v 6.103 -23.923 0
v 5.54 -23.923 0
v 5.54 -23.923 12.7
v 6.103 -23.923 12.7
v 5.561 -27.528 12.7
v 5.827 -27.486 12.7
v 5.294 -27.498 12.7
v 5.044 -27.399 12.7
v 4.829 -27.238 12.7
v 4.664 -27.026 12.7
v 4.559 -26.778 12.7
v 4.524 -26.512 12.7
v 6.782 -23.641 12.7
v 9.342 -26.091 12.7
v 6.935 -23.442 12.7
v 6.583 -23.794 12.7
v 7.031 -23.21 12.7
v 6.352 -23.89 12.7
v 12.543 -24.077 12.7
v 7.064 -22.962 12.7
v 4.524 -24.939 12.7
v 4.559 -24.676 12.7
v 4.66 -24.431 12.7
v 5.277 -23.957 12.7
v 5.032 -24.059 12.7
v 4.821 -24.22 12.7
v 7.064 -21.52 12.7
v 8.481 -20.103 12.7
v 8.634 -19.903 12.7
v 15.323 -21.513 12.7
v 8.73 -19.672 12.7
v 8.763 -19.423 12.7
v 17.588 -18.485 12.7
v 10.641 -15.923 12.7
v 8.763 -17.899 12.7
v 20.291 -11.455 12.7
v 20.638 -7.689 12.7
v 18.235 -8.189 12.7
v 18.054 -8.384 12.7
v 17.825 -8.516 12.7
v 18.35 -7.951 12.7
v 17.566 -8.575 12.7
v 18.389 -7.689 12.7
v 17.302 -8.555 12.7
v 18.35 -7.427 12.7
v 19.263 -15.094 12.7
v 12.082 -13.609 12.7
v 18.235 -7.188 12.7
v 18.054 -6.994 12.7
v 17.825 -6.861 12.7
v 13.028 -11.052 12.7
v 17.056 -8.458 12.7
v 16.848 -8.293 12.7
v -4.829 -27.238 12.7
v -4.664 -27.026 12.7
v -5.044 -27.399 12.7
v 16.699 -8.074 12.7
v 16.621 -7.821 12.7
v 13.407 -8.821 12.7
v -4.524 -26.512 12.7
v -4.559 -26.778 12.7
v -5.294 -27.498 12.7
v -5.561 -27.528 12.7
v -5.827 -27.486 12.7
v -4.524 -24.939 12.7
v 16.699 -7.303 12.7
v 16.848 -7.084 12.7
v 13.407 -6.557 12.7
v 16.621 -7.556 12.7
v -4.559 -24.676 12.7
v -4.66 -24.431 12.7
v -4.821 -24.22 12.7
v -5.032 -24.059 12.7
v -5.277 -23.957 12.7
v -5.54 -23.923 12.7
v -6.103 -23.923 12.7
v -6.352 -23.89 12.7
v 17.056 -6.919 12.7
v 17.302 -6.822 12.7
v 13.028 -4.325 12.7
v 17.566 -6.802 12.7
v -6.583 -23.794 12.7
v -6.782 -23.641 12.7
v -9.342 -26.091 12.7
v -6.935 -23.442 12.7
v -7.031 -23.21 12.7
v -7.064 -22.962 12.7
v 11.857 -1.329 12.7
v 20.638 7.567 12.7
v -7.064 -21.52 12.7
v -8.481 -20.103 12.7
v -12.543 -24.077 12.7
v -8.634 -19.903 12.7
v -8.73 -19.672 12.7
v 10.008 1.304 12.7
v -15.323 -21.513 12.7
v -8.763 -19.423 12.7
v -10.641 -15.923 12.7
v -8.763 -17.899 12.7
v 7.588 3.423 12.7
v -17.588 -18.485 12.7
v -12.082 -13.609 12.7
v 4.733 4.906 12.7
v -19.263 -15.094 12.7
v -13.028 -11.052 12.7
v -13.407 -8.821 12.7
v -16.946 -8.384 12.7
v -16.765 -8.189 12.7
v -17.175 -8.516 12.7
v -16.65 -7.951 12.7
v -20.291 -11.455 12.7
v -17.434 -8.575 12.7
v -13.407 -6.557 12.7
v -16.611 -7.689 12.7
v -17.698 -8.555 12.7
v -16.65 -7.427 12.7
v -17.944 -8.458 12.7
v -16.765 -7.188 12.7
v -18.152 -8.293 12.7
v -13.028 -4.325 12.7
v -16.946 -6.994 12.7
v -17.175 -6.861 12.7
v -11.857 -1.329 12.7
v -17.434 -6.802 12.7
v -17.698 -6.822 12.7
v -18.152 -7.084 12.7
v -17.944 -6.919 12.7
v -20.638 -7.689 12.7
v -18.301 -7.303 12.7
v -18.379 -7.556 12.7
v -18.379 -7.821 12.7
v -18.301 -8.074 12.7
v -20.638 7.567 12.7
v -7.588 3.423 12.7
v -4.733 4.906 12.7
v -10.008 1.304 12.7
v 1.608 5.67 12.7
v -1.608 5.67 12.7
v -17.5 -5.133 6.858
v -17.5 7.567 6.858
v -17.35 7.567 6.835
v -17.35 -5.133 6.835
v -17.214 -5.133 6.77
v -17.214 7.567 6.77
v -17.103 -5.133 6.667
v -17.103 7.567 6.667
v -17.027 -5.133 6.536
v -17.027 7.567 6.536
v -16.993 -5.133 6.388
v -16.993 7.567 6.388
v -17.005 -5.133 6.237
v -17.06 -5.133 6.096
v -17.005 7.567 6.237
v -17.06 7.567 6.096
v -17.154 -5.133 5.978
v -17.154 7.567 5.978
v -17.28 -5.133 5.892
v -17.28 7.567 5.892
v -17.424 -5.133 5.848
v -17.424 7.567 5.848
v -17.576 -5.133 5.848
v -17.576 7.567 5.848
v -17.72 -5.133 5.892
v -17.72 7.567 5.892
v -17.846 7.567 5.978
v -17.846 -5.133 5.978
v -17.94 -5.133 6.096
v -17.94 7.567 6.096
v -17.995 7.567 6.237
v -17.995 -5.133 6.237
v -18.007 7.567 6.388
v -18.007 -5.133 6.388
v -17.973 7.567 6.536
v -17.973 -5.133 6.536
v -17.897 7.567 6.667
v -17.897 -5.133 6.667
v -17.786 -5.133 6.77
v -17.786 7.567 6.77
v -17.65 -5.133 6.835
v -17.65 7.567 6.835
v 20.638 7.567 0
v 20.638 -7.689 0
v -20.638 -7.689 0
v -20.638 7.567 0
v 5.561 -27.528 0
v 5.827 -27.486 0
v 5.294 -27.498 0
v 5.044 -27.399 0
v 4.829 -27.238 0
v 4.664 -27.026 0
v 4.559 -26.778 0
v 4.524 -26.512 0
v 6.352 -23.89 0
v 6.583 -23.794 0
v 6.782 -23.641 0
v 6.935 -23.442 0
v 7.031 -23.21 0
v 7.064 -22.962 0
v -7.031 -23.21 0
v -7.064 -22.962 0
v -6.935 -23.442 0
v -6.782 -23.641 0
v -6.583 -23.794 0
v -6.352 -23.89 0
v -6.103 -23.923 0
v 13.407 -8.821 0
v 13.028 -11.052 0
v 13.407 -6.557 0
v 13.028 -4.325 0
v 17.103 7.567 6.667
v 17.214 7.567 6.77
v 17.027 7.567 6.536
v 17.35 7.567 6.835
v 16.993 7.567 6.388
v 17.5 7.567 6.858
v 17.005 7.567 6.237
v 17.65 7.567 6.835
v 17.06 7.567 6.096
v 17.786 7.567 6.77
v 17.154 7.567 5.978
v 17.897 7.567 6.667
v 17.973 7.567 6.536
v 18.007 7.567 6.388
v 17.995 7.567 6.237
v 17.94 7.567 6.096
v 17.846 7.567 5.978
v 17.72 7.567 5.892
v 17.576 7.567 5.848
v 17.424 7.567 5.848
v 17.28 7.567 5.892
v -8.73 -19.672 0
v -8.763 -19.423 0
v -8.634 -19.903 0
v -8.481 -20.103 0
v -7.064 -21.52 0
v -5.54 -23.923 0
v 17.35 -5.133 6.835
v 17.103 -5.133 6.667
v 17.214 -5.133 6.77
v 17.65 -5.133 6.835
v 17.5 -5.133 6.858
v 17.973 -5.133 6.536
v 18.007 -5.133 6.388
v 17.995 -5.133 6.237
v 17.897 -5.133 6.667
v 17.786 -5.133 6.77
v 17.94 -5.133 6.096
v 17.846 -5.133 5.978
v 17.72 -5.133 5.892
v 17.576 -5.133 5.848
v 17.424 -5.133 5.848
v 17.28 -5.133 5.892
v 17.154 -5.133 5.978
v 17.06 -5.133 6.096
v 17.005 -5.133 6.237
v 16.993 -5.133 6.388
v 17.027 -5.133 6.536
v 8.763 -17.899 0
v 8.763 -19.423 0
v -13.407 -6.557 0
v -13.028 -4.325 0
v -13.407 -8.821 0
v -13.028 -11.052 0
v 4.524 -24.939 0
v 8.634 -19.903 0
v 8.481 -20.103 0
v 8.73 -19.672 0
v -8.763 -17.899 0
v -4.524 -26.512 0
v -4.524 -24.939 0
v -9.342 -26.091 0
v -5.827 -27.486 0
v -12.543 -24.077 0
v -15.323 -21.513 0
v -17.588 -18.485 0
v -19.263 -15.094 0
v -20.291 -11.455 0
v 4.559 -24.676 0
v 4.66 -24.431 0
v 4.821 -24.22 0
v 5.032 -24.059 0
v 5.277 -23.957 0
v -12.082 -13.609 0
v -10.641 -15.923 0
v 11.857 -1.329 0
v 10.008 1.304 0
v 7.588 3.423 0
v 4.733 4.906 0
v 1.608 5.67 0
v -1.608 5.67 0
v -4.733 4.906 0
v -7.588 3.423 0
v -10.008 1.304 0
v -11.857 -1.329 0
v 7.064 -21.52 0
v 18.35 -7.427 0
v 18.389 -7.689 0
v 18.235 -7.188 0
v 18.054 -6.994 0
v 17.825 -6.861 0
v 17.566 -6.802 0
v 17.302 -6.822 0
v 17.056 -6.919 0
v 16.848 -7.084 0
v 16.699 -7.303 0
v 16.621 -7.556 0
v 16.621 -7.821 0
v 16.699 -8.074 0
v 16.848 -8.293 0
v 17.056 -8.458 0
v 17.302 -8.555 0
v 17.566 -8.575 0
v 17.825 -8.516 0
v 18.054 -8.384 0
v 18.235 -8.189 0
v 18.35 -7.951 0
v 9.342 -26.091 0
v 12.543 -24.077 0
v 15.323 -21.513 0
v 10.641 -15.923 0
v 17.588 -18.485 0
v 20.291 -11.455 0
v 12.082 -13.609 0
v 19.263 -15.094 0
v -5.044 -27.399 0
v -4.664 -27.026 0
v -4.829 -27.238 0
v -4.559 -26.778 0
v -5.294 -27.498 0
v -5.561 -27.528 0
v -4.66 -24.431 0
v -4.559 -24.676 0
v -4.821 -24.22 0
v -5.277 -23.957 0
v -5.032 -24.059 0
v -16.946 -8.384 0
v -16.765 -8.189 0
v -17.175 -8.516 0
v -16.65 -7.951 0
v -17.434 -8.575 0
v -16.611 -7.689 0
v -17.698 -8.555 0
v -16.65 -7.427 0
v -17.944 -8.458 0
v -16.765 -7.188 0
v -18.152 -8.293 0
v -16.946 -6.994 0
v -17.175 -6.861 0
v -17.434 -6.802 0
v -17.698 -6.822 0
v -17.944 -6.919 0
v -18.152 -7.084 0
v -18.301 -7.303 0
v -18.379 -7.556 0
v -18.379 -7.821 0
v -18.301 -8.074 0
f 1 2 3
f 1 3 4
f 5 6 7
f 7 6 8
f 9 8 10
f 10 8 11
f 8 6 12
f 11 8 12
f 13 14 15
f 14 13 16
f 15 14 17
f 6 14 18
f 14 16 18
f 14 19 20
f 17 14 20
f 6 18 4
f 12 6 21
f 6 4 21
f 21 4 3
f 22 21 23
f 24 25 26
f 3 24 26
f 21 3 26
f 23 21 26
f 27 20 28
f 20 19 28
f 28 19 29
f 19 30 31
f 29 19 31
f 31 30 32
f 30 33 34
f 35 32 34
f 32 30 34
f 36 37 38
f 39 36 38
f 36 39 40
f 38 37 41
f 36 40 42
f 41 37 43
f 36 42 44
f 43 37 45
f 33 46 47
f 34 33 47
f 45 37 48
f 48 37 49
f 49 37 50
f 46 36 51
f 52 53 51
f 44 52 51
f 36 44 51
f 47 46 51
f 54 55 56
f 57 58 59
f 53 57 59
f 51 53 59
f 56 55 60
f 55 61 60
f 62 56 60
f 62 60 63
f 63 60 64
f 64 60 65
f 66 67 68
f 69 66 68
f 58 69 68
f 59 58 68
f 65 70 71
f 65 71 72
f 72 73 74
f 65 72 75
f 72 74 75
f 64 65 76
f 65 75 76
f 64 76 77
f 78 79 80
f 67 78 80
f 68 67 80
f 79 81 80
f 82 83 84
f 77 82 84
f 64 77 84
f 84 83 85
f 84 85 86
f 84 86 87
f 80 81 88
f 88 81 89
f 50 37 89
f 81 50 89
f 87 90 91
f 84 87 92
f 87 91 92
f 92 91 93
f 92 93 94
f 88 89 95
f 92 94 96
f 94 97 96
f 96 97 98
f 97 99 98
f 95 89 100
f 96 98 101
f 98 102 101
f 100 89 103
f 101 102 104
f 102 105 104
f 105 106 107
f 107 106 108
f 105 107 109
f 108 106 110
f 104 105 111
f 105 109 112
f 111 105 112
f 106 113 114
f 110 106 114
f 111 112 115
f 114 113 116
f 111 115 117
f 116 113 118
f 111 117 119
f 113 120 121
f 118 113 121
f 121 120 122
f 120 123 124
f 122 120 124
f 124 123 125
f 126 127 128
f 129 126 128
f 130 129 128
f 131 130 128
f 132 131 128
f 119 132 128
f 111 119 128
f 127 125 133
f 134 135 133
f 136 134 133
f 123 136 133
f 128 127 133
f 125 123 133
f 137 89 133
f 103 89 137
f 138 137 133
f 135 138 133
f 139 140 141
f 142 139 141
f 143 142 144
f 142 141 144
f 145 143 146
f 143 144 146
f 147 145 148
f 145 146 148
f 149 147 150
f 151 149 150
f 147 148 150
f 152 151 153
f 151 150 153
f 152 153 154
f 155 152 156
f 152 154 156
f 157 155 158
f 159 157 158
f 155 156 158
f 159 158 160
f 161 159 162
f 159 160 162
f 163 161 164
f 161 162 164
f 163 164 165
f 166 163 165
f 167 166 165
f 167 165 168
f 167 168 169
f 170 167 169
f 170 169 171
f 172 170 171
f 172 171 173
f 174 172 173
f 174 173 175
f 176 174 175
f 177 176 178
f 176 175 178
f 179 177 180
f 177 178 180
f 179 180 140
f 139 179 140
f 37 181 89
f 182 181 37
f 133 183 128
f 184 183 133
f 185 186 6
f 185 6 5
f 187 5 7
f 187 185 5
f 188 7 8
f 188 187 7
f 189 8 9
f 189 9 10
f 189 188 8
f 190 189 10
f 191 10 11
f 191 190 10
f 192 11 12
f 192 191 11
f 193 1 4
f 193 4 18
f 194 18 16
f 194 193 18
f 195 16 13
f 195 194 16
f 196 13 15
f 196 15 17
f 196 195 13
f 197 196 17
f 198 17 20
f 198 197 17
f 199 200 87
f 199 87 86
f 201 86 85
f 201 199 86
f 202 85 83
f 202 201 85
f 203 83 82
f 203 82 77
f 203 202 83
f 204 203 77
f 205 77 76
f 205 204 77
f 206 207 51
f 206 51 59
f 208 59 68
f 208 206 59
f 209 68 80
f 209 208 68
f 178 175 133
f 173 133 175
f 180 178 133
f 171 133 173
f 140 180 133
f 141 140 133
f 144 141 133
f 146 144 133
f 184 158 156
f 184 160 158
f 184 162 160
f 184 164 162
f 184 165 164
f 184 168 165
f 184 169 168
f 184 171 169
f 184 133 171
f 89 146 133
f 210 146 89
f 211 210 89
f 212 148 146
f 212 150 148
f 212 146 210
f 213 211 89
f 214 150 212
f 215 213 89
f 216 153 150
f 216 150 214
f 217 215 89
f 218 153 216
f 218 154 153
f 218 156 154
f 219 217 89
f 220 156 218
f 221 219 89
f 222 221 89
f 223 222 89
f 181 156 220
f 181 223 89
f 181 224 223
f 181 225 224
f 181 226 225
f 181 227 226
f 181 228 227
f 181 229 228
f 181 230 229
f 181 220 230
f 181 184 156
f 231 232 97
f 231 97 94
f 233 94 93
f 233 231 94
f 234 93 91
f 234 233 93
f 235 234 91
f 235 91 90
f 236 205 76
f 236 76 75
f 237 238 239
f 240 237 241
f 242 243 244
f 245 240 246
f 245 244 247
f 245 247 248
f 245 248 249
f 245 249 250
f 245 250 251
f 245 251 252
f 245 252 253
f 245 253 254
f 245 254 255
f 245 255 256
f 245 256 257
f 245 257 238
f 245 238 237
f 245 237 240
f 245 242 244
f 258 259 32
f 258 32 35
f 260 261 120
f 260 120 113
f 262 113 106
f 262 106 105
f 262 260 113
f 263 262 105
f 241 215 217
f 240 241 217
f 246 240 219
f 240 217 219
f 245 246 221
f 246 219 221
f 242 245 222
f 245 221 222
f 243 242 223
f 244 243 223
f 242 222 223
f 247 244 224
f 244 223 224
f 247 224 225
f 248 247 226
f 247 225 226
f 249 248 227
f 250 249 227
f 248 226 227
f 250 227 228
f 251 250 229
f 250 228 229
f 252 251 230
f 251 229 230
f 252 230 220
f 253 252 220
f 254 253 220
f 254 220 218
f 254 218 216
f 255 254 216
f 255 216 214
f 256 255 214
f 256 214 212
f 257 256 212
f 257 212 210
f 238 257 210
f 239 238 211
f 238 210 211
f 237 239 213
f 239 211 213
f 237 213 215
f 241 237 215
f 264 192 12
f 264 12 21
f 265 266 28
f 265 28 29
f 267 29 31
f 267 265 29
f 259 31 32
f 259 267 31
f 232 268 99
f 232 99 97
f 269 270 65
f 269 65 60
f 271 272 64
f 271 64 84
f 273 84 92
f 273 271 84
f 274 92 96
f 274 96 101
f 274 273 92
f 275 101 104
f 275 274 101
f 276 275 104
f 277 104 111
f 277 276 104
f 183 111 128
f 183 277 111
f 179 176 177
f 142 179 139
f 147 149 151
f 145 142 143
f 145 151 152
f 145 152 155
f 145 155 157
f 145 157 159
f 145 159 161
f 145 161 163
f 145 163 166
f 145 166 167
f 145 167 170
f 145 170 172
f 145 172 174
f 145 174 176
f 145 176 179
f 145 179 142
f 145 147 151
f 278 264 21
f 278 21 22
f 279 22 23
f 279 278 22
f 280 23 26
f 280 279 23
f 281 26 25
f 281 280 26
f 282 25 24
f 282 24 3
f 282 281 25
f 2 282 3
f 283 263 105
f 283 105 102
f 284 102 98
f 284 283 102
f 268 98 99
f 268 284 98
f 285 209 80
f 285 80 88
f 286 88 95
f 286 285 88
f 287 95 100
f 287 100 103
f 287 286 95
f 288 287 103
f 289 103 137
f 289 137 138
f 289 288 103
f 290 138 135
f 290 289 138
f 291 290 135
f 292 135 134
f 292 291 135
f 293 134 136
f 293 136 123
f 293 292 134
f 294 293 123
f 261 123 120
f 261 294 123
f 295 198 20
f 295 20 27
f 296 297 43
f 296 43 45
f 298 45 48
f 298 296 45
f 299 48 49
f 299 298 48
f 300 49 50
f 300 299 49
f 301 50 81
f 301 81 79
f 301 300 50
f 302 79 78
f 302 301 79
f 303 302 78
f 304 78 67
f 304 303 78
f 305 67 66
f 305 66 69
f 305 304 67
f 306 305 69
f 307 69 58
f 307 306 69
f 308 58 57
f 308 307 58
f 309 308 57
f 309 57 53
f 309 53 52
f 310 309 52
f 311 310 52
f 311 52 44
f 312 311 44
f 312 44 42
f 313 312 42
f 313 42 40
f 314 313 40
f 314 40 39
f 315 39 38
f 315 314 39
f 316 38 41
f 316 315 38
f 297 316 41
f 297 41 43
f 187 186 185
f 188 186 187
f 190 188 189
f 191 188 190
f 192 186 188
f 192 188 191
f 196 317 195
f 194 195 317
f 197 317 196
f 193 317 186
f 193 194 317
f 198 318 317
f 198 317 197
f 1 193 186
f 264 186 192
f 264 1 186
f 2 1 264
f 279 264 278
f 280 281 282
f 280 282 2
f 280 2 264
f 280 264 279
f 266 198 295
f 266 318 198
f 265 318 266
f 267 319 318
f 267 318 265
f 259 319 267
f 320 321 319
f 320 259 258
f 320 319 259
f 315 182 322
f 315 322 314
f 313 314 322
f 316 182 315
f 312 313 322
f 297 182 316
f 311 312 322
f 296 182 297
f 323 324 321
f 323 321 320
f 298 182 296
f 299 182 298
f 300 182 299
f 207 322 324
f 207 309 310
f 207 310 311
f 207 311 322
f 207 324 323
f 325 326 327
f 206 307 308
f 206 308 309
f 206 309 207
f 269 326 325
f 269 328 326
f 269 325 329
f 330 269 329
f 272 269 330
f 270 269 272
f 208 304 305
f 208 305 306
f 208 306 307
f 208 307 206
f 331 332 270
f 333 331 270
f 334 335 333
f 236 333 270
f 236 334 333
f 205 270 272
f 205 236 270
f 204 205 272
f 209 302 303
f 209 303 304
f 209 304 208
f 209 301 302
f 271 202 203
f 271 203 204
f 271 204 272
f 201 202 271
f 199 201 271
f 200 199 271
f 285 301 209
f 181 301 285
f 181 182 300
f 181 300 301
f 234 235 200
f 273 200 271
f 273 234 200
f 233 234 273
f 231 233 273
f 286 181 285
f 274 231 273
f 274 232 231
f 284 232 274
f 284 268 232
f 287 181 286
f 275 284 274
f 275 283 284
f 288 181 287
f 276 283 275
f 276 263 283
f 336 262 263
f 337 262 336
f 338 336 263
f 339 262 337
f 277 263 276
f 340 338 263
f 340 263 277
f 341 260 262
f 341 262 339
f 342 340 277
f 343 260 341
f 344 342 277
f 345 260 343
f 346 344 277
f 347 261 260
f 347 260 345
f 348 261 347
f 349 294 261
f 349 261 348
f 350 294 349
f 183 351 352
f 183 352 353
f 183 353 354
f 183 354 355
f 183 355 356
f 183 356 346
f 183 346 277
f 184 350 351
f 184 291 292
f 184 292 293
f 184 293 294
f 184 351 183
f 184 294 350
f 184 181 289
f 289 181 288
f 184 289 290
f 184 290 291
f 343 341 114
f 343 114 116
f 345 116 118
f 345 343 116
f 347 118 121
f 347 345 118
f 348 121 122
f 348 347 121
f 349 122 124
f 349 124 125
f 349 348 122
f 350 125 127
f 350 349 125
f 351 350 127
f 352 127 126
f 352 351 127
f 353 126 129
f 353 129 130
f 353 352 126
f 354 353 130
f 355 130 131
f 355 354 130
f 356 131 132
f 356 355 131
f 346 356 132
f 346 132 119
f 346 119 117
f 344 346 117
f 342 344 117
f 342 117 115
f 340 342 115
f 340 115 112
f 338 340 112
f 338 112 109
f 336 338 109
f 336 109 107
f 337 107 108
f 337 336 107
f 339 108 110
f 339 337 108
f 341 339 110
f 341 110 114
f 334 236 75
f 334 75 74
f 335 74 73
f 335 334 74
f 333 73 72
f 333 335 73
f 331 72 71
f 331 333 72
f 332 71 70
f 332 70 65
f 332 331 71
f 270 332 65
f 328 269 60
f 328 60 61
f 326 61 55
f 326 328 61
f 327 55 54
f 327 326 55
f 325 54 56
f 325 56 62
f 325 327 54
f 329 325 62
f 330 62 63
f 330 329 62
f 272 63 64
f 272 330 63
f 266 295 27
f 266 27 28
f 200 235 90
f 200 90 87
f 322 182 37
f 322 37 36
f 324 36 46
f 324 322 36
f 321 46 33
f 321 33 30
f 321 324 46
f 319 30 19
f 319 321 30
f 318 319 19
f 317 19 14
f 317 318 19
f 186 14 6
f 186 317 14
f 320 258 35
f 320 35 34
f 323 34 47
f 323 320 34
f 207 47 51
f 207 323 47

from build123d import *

# Parameters (mm, degrees)
SKETCH1_R           = 0.889
BOSS_EXTRUDE1_DEPTH = 12.7
SKETCH2_R           = 0.508
CUT_EXTRUDE1_DEPTH  = 12.7


with BuildPart() as part:
    # Sketch1 → Boss-Extrude1 (new body)
    with BuildSketch(Plane.XY):
        with BuildLine():
            Line((-20.6375, -7.688584311), (-20.6375, 7.567266813))
            Line((-20.6375, 7.567266813), (20.6375, 7.567266813))
            Line((20.6375, 7.567266813), (20.6375, -7.688584311))
            ThreePointArc((20.6375, -7.688584311), (16.525068691, -20.050967212), (5.826741818, -27.486450005))
            ThreePointArc((5.826741818, -27.486450005), (4.931277216, -27.325327691), (4.523886836, -26.511785848))
            Line((4.523886836, -26.511785848), (4.523886836, -24.938668143))
            ThreePointArc((4.523886836, -24.938668143), (4.821466346, -24.220247653), (5.539886836, -23.922668143))
            Line((5.539886836, -23.922668143), (6.102813797, -23.922668143))
            ThreePointArc((6.102813797, -23.922668143), (6.78239506, -23.641176367), (7.063886836, -22.961595104))
            Line((7.063886836, -22.961595104), (7.063886836, -21.519985546))
            Line((7.063886836, -21.519985546), (8.481348217, -20.102524164))
            ThreePointArc((8.481348217, -20.102524164), (8.689682664, -19.79072963), (8.762839993, -19.422942901))
            Line((8.762839993, -19.422942901), (8.762839993, -17.898886311))
            ThreePointArc((8.762839993, -17.898886311), (11.420440685, -14.802736841), (13.027769559, -11.052339947))
            ThreePointArc((13.027769559, -11.052339947), (13.455022544, -7.688584311), (13.027769559, -4.324828675))
            ThreePointArc((13.027769559, -4.324828675), (0, 5.766438233), (-13.027769559, -4.324828675))
            ThreePointArc((-13.027769559, -4.324828675), (-13.455022544, -7.688584311), (-13.027769559, -11.052339947))
            ThreePointArc((-13.027769559, -11.052339947), (-11.420440685, -14.802736841), (-8.762839993, -17.898886311))
            Line((-8.762839993, -17.898886311), (-8.762839993, -19.422942901))
            ThreePointArc((-8.762839993, -19.422942901), (-8.689682664, -19.79072963), (-8.481348217, -20.102524164))
            Line((-8.481348217, -20.102524164), (-7.063886836, -21.519985546))
            Line((-7.063886836, -21.519985546), (-7.063886836, -22.961595104))
            ThreePointArc((-7.063886836, -22.961595104), (-6.78239506, -23.641176367), (-6.102813797, -23.922668143))
            Line((-6.102813797, -23.922668143), (-5.539886836, -23.922668143))
            ThreePointArc((-5.539886836, -23.922668143), (-4.821466346, -24.220247653), (-4.523886836, -24.938668143))
            Line((-4.523886836, -24.938668143), (-4.523886836, -26.511785848))
            ThreePointArc((-4.523886836, -26.511785848), (-4.931277216, -27.325327691), (-5.826741818, -27.486450005))
            ThreePointArc((-5.826741818, -27.486450005), (-16.525068691, -20.050967212), (-20.6375, -7.688584311))
        make_face()
        with Locations((-17.5, -7.688584311)):
            Circle(SKETCH1_R, mode=Mode.SUBTRACT)
        with Locations((17.5, -7.688584311)):
            Circle(SKETCH1_R, mode=Mode.SUBTRACT)
    extrude(amount=BOSS_EXTRUDE1_DEPTH)

    # Sketch2 → Cut-Extrude1 (cut)
    with BuildSketch(Plane(origin=(0, 7.567266813, 0), x_dir=(1, 0, 0), z_dir=(0, 1, 0))):
        with Locations(Location((-17.5, -6.35, 0), (0, 0, 270))):
            Circle(SKETCH2_R)
        with Locations(Location((17.5, -6.35, 0), (0, 0, 270))):
            Circle(SKETCH2_R)
    extrude(amount=-CUT_EXTRUDE1_DEPTH, mode=Mode.SUBTRACT)


solid = part.part
